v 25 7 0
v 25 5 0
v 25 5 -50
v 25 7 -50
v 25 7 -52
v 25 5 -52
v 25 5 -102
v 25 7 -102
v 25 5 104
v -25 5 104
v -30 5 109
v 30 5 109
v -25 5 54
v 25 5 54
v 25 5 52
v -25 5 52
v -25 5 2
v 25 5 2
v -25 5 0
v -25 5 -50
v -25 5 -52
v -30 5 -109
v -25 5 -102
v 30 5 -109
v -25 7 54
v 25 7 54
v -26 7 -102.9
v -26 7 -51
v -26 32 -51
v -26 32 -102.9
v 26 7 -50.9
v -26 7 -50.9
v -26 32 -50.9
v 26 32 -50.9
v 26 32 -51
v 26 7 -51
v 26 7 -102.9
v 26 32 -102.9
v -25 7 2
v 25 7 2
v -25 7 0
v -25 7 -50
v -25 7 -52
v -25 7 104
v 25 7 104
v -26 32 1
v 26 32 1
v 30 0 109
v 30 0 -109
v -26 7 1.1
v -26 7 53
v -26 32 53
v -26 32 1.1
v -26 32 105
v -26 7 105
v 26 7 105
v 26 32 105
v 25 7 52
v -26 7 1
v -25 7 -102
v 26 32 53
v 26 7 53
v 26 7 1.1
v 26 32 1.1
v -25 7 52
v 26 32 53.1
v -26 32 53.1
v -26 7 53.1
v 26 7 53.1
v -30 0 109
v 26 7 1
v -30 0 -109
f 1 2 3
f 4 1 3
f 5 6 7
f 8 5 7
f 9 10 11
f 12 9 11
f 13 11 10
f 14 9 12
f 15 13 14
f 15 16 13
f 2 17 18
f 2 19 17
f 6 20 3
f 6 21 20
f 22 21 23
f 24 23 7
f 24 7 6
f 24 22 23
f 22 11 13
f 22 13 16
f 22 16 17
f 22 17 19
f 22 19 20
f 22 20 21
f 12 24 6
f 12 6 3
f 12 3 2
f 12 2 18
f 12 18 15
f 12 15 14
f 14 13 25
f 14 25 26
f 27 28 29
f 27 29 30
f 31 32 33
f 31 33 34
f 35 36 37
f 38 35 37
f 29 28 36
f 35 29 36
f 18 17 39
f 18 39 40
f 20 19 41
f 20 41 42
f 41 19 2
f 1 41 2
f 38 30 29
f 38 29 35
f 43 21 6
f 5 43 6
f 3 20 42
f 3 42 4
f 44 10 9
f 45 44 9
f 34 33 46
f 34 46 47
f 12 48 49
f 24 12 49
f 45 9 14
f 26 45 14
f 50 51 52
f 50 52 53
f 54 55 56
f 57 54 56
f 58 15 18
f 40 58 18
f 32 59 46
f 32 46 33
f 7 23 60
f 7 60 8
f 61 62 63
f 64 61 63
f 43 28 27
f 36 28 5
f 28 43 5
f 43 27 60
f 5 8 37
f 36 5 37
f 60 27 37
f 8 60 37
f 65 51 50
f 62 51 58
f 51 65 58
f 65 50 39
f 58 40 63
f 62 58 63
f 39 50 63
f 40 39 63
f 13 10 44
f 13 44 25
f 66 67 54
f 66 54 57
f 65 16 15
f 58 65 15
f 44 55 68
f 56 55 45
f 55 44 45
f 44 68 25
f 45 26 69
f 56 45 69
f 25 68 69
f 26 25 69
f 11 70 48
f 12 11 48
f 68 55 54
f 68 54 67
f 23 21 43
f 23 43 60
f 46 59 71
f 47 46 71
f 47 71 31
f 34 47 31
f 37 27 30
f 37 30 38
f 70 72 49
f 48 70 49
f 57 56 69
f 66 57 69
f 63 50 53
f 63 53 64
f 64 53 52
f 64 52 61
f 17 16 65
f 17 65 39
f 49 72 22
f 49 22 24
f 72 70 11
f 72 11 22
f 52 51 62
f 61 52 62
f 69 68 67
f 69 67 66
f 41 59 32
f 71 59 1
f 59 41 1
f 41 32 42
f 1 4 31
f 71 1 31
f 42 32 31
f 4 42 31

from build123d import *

# Parameters (mm, degrees)
SKETCH1_W           = 60
SKETCH1_H           = 218
BOSS_EXTRUDE1_DEPTH = 5
SKETCH2_W           = 50
SKETCH2_H           = 50
BOSS_EXTRUDE3_DEPTH = 2
LPATTERN1_COUNT     = 4
LPATTERN1_PITCH     = 52
SKETCH3_W           = 52
SKETCH3_H           = 51.9
BOSS_EXTRUDE8_DEPTH = 25
LPATTERN5_COUNT     = 4
LPATTERN5_PITCH     = 52


with BuildPart() as part:
    # Sketch1 → Boss-Extrude1 (new body)
    with BuildSketch(Plane(origin=(0, 0, 0), x_dir=(1, 0, 0), z_dir=(0, 1, 0))):
        Rectangle(SKETCH1_W, SKETCH1_H)
    extrude(amount=BOSS_EXTRUDE1_DEPTH)

    # Sketch2 → Boss-Extrude3 (add)
    with BuildSketch(Plane(origin=(0, 5, 0), x_dir=(1, 0, 0), z_dir=(0, 1, 0))):
        with Locations((0, -79)):
            Rectangle(SKETCH2_W, SKETCH2_H)
    boss_extrude3 = extrude(amount=BOSS_EXTRUDE3_DEPTH)

    # LPattern1: Boss-Extrude3 ×4
    with Locations(*[(0, 0, -i * LPATTERN1_PITCH) for i in range(1, LPATTERN1_COUNT)]):
        add(boss_extrude3)

    # Sketch3 → Boss-Extrude8 (add)
    with BuildSketch(Plane(origin=(0, 7, 0), x_dir=(1, 0, 0), z_dir=(0, 1, 0))):
        with Locations((0, -79.05)):
            Rectangle(SKETCH3_W, SKETCH3_H)
    boss_extrude8 = extrude(amount=BOSS_EXTRUDE8_DEPTH)

    # LPattern5: Boss-Extrude8 ×4
    with Locations(*[(0, 0, -i * LPATTERN5_PITCH) for i in range(1, LPATTERN5_COUNT)]):
        add(boss_extrude8)


solid = part.part
